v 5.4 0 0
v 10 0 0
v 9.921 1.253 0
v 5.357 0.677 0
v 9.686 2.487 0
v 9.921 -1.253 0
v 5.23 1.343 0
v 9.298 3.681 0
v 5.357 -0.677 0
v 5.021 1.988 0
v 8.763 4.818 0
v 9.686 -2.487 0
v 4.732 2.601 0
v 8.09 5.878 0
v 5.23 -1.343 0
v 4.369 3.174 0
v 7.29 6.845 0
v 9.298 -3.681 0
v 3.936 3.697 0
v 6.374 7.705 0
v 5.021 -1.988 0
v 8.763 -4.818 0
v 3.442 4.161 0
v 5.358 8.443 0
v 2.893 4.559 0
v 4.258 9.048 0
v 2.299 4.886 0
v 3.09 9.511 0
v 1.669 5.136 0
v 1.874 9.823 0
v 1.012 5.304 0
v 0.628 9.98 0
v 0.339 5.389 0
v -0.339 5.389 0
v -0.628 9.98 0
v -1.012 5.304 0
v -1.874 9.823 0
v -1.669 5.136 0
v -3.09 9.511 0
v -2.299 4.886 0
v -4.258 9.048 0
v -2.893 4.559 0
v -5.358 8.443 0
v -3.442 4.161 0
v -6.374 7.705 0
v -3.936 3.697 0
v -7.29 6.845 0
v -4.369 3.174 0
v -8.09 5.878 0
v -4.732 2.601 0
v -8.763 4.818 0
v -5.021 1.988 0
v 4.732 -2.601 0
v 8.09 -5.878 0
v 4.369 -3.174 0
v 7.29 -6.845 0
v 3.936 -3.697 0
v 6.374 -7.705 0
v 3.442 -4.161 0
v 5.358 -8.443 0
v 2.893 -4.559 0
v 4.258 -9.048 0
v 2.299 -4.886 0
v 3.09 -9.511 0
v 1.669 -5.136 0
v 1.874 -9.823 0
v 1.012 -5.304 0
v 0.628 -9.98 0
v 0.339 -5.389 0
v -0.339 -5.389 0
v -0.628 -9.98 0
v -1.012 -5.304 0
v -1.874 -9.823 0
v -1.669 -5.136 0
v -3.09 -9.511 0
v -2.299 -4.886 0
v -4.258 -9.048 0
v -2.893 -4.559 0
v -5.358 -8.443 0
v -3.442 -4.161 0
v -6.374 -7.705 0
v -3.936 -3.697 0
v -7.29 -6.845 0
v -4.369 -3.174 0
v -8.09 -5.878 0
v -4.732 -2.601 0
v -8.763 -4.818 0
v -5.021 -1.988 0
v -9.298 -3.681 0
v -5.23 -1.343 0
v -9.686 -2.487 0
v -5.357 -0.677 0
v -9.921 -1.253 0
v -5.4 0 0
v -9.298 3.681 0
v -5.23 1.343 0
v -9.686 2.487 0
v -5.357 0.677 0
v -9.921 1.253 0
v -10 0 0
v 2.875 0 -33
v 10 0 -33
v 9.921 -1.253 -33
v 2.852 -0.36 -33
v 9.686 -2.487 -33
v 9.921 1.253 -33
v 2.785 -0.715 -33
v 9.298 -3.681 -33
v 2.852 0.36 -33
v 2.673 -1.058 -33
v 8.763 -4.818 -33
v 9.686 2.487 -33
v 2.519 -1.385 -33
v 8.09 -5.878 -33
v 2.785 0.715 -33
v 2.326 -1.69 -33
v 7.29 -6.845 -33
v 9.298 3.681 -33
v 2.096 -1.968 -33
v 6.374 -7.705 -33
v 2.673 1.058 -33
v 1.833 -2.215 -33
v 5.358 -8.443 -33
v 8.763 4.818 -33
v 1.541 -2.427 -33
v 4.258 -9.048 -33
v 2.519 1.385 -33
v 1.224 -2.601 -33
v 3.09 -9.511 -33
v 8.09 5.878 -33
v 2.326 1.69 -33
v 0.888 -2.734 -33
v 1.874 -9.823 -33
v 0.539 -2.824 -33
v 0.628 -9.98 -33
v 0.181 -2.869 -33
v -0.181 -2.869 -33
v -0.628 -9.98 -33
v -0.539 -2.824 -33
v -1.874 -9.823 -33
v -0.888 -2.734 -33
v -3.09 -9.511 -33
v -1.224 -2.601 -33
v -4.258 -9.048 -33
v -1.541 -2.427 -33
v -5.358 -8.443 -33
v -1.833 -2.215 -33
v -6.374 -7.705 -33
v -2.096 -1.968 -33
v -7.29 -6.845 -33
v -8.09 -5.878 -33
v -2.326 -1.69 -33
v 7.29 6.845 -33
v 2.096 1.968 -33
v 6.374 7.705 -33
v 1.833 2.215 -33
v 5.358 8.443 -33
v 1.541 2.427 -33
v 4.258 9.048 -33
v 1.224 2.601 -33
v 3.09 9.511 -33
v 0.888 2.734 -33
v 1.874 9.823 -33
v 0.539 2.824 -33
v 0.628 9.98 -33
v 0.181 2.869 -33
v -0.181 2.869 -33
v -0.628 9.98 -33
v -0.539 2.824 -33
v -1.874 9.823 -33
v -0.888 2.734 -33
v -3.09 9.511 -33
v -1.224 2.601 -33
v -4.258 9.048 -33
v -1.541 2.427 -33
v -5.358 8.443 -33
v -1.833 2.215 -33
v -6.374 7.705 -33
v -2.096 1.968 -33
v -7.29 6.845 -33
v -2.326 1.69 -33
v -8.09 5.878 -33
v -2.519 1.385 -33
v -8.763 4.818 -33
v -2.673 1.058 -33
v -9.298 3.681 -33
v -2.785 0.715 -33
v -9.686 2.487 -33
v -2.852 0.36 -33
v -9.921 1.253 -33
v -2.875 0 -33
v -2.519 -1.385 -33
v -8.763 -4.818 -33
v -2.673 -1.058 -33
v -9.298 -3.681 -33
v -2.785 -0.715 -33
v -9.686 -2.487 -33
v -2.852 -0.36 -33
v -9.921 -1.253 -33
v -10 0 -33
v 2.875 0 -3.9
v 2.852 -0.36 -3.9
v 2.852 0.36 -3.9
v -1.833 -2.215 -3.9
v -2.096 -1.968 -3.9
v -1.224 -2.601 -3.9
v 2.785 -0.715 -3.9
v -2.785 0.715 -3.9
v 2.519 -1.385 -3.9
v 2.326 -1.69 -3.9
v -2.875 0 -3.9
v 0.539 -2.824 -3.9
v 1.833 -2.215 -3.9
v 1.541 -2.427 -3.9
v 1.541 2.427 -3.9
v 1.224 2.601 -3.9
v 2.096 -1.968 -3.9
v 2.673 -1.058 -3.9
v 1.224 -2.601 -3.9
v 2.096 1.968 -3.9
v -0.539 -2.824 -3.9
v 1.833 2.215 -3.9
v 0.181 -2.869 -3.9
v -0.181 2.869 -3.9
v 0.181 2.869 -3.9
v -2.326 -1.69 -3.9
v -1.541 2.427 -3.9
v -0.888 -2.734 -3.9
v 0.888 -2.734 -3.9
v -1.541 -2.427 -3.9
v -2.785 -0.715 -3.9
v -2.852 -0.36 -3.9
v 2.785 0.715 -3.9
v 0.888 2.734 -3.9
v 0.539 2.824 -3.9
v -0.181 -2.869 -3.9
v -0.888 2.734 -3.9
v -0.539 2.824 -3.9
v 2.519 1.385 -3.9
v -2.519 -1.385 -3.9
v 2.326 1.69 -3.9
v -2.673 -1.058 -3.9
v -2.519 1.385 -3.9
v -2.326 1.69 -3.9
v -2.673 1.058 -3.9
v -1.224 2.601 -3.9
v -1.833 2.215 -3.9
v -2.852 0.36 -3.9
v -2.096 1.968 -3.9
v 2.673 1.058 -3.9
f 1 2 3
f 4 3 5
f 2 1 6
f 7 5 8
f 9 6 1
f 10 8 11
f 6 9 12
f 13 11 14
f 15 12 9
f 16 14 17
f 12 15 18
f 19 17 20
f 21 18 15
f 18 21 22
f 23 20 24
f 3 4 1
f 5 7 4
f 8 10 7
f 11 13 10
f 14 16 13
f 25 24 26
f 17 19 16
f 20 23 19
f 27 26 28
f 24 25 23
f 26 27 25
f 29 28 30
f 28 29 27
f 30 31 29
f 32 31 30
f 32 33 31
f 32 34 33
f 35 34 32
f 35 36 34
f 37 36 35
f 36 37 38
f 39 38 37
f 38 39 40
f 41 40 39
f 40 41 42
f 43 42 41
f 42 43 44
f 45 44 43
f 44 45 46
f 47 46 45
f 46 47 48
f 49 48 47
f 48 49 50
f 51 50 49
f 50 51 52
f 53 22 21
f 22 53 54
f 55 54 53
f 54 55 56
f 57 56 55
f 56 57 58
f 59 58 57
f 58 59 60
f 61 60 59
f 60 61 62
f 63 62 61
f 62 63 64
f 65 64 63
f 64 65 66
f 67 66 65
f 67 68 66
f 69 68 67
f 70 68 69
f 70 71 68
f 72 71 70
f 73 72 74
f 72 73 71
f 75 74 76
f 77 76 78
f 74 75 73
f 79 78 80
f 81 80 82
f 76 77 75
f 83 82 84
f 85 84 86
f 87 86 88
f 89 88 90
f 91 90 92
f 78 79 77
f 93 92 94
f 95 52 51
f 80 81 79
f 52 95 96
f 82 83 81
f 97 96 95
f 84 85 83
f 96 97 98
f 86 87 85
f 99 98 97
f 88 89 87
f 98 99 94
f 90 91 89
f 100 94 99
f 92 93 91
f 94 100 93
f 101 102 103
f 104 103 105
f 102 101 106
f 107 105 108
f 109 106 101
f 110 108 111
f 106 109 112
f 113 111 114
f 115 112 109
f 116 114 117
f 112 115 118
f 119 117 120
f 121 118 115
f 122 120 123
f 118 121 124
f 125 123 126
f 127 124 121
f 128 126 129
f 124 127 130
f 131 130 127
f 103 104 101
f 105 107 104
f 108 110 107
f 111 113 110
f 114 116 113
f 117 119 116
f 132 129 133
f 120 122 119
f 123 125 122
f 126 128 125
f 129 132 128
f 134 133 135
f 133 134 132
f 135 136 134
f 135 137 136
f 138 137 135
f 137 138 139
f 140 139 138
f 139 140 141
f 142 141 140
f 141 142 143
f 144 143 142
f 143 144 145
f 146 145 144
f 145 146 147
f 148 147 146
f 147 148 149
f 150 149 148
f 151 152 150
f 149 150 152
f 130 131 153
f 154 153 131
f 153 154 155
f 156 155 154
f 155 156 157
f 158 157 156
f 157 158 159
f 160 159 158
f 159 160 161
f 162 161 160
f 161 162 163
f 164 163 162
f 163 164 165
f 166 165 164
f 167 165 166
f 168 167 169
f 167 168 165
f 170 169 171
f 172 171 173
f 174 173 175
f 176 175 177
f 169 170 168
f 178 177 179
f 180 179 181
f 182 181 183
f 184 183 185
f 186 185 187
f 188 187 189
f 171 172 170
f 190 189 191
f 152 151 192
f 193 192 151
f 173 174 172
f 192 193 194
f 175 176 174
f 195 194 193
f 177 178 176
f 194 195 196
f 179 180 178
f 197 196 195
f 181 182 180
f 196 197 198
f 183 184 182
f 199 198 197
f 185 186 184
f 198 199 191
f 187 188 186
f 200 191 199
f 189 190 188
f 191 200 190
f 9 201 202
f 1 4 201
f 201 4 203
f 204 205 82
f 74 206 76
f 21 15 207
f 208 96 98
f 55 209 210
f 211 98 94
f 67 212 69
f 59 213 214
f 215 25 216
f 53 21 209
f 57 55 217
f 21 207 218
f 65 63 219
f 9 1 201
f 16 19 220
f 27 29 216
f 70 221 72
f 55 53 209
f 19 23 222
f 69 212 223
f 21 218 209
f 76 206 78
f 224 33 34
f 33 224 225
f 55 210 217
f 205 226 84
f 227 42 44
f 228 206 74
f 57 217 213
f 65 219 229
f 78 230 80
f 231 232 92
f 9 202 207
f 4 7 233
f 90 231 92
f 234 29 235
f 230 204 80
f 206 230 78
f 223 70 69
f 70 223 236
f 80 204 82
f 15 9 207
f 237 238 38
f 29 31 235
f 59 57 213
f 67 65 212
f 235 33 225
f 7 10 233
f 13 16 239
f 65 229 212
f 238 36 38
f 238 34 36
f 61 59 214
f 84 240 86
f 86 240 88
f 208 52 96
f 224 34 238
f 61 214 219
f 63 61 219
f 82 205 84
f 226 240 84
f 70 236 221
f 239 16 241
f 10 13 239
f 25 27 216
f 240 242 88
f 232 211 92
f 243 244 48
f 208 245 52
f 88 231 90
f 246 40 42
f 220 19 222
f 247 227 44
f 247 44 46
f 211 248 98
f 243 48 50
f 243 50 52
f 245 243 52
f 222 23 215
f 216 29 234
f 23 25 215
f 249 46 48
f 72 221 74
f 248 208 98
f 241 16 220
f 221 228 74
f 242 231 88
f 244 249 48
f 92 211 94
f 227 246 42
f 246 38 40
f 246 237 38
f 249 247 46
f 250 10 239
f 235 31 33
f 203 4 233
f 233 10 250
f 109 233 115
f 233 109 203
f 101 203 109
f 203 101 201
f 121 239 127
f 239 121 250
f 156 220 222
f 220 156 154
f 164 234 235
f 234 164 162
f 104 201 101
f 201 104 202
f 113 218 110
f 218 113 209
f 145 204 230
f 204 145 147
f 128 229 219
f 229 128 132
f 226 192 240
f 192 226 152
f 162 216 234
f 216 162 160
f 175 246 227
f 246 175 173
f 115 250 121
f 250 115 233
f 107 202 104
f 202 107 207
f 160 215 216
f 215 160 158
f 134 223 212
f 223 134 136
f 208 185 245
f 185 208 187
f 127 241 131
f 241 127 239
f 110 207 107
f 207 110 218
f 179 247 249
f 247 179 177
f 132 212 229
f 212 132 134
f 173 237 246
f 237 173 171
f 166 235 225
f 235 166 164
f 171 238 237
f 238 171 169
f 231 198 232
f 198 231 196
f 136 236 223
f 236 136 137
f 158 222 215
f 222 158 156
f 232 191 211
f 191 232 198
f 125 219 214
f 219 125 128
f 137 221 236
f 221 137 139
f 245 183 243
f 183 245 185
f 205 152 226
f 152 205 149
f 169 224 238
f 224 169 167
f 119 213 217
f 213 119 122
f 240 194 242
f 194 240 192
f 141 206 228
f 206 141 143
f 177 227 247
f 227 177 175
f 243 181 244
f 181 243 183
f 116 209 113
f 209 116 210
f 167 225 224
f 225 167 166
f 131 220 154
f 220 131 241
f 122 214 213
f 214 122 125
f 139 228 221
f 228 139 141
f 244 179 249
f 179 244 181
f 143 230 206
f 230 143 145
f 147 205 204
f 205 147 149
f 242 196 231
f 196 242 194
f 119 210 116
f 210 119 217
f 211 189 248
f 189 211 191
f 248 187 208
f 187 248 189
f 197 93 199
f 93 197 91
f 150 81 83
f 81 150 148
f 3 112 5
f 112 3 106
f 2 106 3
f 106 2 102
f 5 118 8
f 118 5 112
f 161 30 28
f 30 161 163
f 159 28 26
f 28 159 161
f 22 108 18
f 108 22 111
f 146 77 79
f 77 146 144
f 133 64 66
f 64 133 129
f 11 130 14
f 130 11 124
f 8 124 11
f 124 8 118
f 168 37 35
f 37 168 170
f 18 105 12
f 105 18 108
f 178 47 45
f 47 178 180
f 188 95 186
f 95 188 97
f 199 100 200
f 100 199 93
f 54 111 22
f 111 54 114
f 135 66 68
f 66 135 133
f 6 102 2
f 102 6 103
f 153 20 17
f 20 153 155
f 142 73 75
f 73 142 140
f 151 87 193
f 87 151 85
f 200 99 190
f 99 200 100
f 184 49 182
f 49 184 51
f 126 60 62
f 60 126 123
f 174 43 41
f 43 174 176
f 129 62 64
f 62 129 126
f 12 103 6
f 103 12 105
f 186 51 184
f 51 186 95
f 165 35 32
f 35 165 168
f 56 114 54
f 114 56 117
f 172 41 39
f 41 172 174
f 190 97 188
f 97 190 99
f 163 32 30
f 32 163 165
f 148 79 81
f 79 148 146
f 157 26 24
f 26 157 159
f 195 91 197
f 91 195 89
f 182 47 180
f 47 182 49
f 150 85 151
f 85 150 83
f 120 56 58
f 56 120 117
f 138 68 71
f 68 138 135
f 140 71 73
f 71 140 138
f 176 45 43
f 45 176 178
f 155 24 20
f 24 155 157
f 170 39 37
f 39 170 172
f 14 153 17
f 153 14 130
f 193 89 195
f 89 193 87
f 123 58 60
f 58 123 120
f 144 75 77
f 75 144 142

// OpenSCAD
$fn = 50;


difference() {
	union() {
		translate(v = [0, 0, -33.0000000000]) {
			cylinder(h = 33, r = 10.0000000000);
		}
	}
	union() {
		translate(v = [0, 0, 0]) {
			rotate(a = [0, 0, 0]) {
				difference() {
					union() {
						#translate(v = [0, 0, -33.0000000000]) {
							cylinder(h = 33, r = 2.6000000000);
						}
						#translate(v = [0, 0, -3.9000000000]) {
							cylinder(h = 3.9000000000, r1 = 2.8750000000, r2 = 5.4000000000);
						}
						#translate(v = [0, 0, -33.0000000000]) {
							cylinder(h = 33, r = 2.8750000000);
						}
						#translate(v = [0, 0, -33.0000000000]) {
							cylinder(h = 33, r = 2.6000000000);
						}
					}
					union();
				}
			}
		}
	}
}
